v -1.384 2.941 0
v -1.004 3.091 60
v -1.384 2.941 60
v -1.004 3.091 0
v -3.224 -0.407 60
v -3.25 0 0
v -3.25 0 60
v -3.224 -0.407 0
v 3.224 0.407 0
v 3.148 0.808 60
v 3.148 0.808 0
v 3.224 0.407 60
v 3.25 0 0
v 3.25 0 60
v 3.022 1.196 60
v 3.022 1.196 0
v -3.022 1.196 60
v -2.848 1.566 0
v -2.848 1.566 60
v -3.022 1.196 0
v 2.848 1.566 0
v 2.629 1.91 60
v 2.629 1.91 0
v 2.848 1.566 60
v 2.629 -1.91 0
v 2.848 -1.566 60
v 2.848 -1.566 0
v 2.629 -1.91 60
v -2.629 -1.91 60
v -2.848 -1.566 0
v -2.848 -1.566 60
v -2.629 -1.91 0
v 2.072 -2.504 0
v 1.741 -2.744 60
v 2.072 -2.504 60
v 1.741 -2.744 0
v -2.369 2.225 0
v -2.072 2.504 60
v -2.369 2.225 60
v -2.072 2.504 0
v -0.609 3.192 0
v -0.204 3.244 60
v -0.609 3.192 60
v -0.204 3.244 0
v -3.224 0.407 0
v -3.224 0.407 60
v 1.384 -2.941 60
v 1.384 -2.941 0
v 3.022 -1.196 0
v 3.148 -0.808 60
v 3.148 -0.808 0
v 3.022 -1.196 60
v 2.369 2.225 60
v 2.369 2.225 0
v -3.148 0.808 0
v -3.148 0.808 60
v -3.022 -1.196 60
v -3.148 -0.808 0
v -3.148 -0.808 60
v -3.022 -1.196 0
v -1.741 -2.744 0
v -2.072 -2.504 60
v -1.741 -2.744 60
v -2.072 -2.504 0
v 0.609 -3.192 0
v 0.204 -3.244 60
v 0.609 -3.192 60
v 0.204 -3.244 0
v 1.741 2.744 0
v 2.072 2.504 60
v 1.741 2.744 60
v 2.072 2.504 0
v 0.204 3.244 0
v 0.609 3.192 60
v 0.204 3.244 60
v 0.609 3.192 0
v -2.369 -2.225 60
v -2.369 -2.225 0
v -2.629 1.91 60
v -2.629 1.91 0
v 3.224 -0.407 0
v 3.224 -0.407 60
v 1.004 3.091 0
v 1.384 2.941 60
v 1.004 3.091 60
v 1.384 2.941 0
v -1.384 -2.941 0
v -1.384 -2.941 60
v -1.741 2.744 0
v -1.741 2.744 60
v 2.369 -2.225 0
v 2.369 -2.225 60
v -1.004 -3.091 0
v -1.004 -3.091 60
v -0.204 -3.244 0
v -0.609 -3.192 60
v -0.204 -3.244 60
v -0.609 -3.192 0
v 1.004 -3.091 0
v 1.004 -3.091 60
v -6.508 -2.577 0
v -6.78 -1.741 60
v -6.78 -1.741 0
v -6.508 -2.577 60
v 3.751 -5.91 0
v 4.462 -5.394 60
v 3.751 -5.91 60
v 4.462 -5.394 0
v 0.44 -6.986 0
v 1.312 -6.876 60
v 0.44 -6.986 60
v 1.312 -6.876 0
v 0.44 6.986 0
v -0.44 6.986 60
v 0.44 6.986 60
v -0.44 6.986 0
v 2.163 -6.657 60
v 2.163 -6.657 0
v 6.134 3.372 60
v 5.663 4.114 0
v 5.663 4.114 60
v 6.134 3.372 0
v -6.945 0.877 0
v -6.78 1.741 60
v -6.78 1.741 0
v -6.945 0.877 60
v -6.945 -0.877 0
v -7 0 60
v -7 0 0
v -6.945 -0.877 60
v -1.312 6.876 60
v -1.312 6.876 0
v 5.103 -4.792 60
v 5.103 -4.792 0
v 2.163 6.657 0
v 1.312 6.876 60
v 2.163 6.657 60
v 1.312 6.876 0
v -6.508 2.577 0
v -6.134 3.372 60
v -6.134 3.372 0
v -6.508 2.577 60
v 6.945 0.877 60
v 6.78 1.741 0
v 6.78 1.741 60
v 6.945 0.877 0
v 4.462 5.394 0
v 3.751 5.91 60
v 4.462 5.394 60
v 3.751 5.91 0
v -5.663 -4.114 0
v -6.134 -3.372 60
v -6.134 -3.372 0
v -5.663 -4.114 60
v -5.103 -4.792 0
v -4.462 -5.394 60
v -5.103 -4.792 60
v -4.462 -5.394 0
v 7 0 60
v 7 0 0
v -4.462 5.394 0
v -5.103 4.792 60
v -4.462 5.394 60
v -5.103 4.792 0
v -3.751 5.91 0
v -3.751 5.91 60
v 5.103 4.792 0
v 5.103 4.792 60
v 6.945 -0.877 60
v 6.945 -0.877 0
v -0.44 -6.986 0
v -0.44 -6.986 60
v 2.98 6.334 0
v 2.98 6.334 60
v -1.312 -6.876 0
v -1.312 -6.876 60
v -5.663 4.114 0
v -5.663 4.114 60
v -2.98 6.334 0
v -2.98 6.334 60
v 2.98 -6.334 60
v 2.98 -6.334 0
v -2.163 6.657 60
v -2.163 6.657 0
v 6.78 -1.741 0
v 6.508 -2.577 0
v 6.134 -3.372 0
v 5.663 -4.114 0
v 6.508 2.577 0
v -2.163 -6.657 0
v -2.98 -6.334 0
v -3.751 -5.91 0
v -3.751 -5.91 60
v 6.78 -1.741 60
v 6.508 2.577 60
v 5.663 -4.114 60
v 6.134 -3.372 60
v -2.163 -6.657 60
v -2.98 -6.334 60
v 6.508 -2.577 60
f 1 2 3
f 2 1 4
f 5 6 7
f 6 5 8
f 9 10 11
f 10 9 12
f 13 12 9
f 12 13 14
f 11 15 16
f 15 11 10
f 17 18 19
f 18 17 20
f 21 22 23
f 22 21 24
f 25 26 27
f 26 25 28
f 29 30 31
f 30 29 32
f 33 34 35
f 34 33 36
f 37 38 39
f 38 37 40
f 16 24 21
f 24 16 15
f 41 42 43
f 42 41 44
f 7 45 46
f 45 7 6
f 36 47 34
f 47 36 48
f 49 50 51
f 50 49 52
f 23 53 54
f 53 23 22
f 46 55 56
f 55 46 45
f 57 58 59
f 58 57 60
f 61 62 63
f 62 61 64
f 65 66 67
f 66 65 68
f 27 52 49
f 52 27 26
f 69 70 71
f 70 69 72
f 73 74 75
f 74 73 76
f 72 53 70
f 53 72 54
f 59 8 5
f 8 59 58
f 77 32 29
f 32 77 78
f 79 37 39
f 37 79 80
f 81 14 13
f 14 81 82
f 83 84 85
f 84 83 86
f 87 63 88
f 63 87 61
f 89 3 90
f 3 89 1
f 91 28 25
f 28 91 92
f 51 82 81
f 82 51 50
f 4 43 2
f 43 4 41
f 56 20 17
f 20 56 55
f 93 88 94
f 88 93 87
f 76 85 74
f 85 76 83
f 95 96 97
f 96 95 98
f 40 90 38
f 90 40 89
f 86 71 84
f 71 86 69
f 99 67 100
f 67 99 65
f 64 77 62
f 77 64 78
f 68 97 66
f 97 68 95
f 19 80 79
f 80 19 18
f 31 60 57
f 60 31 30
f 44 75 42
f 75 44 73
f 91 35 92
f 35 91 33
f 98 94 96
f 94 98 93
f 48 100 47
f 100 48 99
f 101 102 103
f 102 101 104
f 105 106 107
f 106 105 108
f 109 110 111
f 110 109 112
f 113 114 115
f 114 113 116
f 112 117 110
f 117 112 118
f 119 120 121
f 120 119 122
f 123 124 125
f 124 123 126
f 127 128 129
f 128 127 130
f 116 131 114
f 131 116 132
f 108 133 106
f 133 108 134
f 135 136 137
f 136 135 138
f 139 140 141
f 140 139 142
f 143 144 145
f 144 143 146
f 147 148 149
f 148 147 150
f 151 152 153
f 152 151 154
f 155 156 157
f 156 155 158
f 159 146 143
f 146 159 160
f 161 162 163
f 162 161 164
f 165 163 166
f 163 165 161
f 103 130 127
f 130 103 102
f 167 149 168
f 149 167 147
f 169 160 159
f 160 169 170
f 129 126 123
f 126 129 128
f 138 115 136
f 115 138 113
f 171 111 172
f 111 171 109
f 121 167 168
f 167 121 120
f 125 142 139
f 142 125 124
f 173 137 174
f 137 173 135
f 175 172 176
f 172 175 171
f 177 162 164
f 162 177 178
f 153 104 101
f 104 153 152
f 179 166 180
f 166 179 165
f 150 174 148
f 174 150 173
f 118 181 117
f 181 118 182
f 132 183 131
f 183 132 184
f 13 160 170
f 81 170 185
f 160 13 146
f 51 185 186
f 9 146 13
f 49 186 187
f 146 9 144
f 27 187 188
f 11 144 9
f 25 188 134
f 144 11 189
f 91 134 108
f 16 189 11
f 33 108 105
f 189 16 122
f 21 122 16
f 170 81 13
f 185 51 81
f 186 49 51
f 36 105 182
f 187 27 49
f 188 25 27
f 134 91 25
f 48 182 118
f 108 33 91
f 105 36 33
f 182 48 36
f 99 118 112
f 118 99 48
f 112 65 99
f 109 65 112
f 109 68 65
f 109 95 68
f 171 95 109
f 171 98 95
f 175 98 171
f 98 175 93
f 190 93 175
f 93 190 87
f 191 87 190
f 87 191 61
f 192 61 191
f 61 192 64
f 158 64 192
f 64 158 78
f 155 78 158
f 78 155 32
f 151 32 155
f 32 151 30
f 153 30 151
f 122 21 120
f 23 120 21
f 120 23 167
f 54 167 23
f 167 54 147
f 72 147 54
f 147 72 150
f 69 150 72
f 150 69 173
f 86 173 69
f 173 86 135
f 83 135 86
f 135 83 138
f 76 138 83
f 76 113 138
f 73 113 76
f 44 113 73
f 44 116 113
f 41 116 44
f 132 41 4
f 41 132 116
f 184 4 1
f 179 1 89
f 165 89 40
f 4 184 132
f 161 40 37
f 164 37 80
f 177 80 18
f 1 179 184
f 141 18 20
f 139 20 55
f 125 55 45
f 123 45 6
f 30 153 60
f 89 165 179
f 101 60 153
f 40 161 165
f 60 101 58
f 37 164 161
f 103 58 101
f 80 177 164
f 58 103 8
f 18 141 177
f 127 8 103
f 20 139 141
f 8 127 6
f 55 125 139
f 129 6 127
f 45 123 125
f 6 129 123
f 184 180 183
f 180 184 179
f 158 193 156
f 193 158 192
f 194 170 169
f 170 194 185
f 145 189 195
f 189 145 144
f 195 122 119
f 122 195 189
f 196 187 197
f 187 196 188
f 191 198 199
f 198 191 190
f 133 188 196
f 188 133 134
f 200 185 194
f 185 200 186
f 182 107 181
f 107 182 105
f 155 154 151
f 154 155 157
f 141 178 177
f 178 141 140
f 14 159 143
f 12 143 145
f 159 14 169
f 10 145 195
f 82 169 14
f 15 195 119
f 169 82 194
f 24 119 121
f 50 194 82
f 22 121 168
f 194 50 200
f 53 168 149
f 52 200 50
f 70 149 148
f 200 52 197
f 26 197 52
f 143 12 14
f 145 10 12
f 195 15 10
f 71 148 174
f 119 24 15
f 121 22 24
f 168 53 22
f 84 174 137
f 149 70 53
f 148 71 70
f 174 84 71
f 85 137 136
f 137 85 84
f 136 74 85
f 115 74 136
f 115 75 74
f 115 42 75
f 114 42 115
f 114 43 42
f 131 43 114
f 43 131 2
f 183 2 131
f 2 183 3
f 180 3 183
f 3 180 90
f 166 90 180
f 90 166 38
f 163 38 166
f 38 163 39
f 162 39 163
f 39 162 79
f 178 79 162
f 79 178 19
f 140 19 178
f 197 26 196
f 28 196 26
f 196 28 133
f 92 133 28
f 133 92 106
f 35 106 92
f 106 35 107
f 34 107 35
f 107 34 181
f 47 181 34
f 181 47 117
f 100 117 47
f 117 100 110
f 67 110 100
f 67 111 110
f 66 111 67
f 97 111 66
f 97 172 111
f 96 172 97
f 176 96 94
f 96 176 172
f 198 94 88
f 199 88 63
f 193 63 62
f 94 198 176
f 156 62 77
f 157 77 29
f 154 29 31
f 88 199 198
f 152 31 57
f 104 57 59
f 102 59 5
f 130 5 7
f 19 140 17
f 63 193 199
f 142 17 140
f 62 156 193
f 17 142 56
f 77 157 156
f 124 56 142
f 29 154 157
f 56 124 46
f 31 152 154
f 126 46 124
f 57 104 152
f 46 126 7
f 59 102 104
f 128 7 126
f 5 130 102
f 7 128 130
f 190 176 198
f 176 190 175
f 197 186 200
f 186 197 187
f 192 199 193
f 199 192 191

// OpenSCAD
$fn = 50;


difference() {
	union() {
		cylinder(h = 60, r = 7.0000000000);
	}
	union() {
		translate(v = [0, 0, -100]) {
			cylinder(h = 200, r = 3.2500000000);
		}
		translate(v = [0, 0, -100]) {
			cylinder(h = 200, r = 1.8000000000);
		}
	}
}
